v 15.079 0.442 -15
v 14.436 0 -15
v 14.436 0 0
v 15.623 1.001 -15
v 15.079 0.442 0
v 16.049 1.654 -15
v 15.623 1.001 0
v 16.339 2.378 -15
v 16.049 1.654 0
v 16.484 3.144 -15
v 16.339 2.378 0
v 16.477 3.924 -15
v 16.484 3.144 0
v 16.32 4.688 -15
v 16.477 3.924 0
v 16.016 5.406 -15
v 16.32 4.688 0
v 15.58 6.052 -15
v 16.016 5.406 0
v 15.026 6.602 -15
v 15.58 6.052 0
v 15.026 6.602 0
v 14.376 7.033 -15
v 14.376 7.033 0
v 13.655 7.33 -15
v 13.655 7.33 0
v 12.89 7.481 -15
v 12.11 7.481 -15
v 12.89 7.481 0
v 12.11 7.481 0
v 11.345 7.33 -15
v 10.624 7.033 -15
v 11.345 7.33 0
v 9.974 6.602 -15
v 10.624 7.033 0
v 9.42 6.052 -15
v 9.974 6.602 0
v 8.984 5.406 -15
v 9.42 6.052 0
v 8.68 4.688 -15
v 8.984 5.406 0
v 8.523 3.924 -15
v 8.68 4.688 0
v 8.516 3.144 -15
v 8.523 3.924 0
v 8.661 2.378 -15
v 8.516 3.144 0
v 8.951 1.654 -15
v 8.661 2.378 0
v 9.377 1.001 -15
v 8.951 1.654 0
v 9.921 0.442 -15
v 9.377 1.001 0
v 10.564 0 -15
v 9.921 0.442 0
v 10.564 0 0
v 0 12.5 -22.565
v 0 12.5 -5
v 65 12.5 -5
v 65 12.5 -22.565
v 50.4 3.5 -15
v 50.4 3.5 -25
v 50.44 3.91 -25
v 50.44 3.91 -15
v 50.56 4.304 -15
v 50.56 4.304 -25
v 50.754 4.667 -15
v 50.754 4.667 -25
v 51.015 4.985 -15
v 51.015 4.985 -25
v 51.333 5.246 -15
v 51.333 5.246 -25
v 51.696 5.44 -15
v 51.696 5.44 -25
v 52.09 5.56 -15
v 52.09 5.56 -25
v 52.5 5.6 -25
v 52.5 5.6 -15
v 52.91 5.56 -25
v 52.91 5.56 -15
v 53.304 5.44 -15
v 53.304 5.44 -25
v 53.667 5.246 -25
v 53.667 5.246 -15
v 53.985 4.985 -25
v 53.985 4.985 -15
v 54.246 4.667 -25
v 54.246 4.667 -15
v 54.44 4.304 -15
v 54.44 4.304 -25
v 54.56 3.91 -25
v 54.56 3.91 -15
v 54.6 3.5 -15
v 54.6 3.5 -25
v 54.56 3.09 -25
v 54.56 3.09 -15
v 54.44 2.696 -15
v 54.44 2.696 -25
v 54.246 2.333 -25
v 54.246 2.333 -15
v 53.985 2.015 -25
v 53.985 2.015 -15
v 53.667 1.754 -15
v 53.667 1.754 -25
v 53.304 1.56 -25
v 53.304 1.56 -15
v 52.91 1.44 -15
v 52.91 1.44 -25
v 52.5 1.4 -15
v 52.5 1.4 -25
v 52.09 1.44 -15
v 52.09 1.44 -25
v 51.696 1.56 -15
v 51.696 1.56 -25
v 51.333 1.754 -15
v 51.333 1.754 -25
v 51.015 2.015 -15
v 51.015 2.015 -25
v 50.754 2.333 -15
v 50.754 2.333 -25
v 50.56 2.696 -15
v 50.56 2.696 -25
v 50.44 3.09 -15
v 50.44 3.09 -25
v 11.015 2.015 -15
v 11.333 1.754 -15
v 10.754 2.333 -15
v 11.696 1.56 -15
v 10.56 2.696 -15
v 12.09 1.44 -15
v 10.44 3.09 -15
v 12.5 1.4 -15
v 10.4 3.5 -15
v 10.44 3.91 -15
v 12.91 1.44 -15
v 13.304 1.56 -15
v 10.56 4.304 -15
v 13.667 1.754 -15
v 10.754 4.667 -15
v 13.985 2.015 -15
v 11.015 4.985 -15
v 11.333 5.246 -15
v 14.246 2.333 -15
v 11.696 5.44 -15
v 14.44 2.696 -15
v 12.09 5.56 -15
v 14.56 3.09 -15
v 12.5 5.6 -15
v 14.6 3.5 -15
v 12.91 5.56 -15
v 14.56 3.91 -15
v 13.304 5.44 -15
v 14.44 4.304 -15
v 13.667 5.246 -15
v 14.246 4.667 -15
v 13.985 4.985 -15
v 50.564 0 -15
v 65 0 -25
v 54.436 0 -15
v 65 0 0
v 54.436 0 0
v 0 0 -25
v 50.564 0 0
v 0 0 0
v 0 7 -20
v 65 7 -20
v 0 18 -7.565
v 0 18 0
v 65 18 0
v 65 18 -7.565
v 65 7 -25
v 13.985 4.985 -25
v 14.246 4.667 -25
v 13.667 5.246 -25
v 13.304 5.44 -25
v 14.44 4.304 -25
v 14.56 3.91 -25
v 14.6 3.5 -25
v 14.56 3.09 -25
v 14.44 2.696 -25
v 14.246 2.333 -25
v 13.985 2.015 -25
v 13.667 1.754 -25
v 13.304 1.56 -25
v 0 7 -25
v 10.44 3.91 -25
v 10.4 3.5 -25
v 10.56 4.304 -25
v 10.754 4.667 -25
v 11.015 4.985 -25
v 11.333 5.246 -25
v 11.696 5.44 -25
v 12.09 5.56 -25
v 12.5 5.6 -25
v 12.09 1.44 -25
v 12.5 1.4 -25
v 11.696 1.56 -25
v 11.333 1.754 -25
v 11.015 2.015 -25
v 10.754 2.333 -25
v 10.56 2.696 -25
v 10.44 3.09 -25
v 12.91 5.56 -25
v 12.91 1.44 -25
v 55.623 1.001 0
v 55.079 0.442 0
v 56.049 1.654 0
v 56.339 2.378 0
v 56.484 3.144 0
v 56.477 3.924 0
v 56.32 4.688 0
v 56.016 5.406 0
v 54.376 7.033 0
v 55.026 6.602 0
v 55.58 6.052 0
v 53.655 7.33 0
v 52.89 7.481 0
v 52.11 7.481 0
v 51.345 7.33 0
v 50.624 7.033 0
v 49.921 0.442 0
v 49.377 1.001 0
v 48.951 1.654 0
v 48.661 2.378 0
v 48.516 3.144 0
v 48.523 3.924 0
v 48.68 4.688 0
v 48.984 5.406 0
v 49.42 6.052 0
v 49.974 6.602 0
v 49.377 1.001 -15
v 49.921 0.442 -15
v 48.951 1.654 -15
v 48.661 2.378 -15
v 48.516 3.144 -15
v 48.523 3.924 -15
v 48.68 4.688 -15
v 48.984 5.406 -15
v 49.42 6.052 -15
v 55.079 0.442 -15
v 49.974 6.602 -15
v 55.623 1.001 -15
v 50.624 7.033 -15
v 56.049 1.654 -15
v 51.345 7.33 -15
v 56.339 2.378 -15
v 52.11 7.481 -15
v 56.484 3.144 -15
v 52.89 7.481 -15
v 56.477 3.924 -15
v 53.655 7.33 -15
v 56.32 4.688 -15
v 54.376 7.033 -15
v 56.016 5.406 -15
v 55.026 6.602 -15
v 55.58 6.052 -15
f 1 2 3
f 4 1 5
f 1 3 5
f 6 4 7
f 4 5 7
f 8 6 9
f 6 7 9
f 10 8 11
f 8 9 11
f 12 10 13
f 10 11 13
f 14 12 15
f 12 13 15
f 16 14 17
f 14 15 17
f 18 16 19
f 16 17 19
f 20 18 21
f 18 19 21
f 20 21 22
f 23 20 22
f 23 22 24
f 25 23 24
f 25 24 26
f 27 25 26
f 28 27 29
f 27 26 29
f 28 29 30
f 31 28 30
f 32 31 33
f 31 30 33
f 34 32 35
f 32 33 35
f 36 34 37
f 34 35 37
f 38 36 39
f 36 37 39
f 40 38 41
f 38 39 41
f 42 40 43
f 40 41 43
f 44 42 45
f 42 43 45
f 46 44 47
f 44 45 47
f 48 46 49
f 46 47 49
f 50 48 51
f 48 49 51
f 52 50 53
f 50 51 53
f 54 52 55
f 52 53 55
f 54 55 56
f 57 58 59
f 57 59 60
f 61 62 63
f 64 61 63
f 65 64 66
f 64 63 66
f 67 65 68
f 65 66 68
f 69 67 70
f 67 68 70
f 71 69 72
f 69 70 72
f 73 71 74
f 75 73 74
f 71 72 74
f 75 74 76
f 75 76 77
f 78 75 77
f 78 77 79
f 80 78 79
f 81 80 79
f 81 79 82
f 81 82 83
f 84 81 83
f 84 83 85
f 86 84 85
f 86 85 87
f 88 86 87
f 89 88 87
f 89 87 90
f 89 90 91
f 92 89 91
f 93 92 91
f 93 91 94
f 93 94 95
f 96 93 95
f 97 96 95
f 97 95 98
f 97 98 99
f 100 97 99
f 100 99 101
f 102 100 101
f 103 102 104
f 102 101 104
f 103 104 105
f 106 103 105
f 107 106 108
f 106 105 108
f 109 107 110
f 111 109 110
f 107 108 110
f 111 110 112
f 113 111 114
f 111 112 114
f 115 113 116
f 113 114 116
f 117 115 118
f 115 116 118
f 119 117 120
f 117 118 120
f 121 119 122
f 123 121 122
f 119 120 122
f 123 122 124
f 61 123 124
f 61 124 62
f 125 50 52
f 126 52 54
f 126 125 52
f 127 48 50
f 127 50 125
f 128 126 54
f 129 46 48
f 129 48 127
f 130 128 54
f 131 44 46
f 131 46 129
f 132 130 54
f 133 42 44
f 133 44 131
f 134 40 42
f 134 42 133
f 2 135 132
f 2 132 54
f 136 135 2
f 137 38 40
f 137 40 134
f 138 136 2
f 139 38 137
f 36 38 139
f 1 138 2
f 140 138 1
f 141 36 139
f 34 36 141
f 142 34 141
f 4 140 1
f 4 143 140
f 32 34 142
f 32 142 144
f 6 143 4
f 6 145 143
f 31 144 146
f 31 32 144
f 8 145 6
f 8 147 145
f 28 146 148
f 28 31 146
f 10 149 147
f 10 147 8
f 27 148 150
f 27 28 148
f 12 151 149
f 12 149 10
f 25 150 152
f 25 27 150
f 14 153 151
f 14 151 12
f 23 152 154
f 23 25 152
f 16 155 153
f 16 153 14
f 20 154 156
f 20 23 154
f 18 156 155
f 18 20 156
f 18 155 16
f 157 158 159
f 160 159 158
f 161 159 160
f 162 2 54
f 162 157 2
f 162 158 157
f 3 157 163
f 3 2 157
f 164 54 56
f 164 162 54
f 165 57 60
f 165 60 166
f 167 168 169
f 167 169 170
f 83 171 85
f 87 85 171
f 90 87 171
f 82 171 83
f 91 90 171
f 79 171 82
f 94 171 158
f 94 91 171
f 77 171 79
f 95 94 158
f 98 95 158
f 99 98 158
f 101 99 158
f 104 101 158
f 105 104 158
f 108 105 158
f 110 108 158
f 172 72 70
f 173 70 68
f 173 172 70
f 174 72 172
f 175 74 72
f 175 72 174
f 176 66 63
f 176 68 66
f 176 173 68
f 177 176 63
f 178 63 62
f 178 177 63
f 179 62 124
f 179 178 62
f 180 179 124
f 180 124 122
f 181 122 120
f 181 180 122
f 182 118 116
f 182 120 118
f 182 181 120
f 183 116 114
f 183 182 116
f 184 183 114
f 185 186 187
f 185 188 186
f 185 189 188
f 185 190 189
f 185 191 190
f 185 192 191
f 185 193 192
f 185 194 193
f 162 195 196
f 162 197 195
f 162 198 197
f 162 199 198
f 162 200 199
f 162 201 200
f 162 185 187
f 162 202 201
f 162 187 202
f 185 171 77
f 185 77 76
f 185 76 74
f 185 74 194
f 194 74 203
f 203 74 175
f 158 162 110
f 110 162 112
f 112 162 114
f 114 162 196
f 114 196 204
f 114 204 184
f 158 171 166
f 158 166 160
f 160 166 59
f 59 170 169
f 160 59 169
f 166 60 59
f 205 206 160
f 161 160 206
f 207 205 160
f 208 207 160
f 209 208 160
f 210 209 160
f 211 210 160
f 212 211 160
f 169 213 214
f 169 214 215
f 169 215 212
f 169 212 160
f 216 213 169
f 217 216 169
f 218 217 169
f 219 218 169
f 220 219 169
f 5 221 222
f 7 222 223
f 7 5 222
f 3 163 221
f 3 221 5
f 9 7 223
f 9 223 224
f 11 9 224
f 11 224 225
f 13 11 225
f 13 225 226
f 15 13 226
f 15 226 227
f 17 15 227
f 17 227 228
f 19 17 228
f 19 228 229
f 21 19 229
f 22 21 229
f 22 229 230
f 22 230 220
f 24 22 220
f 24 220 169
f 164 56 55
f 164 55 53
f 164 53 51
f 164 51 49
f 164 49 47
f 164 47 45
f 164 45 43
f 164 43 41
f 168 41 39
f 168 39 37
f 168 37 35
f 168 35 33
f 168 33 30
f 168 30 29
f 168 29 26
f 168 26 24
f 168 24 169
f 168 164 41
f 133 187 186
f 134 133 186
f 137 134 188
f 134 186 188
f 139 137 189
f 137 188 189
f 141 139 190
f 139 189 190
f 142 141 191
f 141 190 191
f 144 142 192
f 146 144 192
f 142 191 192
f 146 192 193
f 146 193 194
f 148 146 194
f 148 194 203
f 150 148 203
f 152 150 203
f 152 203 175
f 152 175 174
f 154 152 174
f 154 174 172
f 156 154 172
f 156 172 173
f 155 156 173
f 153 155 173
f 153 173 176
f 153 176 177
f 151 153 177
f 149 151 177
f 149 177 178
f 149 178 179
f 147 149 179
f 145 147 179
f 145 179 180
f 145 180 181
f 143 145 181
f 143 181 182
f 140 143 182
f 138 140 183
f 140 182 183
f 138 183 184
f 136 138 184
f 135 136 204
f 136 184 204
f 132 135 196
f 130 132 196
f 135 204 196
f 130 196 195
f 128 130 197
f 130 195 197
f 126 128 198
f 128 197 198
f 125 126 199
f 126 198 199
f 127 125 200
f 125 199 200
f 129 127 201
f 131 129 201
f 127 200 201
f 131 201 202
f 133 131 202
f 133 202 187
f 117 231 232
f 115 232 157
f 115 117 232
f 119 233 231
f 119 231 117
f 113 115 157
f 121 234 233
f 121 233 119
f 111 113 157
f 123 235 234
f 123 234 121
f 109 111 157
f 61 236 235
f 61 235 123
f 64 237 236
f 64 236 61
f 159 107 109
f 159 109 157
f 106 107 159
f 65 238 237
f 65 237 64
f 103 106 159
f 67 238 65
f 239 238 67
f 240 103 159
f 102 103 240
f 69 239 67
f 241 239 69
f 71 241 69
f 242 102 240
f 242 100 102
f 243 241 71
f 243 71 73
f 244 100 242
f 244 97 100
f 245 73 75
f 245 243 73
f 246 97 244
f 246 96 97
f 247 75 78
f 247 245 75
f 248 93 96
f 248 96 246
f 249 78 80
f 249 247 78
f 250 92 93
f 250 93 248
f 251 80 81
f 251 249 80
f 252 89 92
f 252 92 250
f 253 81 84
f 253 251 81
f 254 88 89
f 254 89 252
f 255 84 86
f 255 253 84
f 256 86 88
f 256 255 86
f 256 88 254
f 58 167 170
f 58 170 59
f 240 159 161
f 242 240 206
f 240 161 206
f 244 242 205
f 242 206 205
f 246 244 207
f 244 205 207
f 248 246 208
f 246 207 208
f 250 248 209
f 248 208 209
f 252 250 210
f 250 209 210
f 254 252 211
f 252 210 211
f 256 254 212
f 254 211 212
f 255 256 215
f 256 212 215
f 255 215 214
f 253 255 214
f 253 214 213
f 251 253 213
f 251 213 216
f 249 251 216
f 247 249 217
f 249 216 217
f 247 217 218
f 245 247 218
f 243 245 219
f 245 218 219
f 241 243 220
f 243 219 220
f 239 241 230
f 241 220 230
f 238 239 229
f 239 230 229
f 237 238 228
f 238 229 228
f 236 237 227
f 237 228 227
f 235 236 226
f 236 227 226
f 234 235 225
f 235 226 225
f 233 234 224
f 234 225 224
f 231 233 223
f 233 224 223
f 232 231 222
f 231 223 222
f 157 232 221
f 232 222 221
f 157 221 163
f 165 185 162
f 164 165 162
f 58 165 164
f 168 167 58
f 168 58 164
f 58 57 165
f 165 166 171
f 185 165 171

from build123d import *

# Parameters (mm, degrees)
BOSS_EXTRUDE1_DEPTH = 65
SKETCH2_R           = 2.1
CUT_EXTRUDE1_DEPTH  = 25
SKETCH3_R           = 4
CUT_EXTRUDE2_DEPTH  = 15


with BuildPart() as part:
    # Sketch1 → Boss-Extrude1 (new body)
    with BuildSketch(Plane(origin=(0, 0, 0), x_dir=(0, 0, -1), z_dir=(1, 0, 0))):
        Polygon((0, 0), (0, 18), (7.56469212, 18), (5, 12.5), (22.56469212, 12.5), (20, 7), (25, 7), (25, 0), align=None)
    extrude(amount=BOSS_EXTRUDE1_DEPTH)

    # Sketch2 → Cut-Extrude1 (cut)
    with BuildSketch(Plane(origin=(0, 0, -25), x_dir=(-1, 0, 0), z_dir=(0, 0, -1))):
        with Locations((-12.5, 3.5)):
            Circle(SKETCH2_R)
        with Locations((-52.5, 3.5)):
            Circle(SKETCH2_R)
    extrude(amount=-CUT_EXTRUDE1_DEPTH, mode=Mode.SUBTRACT)

    # Sketch3 → Cut-Extrude2 (cut)
    with BuildSketch(Plane.XY):
        with Locations((12.5, 3.5)):
            Circle(SKETCH3_R)
        with Locations((52.5, 3.5)):
            Circle(SKETCH3_R)
    extrude(amount=-CUT_EXTRUDE2_DEPTH, mode=Mode.SUBTRACT)


solid = part.part
